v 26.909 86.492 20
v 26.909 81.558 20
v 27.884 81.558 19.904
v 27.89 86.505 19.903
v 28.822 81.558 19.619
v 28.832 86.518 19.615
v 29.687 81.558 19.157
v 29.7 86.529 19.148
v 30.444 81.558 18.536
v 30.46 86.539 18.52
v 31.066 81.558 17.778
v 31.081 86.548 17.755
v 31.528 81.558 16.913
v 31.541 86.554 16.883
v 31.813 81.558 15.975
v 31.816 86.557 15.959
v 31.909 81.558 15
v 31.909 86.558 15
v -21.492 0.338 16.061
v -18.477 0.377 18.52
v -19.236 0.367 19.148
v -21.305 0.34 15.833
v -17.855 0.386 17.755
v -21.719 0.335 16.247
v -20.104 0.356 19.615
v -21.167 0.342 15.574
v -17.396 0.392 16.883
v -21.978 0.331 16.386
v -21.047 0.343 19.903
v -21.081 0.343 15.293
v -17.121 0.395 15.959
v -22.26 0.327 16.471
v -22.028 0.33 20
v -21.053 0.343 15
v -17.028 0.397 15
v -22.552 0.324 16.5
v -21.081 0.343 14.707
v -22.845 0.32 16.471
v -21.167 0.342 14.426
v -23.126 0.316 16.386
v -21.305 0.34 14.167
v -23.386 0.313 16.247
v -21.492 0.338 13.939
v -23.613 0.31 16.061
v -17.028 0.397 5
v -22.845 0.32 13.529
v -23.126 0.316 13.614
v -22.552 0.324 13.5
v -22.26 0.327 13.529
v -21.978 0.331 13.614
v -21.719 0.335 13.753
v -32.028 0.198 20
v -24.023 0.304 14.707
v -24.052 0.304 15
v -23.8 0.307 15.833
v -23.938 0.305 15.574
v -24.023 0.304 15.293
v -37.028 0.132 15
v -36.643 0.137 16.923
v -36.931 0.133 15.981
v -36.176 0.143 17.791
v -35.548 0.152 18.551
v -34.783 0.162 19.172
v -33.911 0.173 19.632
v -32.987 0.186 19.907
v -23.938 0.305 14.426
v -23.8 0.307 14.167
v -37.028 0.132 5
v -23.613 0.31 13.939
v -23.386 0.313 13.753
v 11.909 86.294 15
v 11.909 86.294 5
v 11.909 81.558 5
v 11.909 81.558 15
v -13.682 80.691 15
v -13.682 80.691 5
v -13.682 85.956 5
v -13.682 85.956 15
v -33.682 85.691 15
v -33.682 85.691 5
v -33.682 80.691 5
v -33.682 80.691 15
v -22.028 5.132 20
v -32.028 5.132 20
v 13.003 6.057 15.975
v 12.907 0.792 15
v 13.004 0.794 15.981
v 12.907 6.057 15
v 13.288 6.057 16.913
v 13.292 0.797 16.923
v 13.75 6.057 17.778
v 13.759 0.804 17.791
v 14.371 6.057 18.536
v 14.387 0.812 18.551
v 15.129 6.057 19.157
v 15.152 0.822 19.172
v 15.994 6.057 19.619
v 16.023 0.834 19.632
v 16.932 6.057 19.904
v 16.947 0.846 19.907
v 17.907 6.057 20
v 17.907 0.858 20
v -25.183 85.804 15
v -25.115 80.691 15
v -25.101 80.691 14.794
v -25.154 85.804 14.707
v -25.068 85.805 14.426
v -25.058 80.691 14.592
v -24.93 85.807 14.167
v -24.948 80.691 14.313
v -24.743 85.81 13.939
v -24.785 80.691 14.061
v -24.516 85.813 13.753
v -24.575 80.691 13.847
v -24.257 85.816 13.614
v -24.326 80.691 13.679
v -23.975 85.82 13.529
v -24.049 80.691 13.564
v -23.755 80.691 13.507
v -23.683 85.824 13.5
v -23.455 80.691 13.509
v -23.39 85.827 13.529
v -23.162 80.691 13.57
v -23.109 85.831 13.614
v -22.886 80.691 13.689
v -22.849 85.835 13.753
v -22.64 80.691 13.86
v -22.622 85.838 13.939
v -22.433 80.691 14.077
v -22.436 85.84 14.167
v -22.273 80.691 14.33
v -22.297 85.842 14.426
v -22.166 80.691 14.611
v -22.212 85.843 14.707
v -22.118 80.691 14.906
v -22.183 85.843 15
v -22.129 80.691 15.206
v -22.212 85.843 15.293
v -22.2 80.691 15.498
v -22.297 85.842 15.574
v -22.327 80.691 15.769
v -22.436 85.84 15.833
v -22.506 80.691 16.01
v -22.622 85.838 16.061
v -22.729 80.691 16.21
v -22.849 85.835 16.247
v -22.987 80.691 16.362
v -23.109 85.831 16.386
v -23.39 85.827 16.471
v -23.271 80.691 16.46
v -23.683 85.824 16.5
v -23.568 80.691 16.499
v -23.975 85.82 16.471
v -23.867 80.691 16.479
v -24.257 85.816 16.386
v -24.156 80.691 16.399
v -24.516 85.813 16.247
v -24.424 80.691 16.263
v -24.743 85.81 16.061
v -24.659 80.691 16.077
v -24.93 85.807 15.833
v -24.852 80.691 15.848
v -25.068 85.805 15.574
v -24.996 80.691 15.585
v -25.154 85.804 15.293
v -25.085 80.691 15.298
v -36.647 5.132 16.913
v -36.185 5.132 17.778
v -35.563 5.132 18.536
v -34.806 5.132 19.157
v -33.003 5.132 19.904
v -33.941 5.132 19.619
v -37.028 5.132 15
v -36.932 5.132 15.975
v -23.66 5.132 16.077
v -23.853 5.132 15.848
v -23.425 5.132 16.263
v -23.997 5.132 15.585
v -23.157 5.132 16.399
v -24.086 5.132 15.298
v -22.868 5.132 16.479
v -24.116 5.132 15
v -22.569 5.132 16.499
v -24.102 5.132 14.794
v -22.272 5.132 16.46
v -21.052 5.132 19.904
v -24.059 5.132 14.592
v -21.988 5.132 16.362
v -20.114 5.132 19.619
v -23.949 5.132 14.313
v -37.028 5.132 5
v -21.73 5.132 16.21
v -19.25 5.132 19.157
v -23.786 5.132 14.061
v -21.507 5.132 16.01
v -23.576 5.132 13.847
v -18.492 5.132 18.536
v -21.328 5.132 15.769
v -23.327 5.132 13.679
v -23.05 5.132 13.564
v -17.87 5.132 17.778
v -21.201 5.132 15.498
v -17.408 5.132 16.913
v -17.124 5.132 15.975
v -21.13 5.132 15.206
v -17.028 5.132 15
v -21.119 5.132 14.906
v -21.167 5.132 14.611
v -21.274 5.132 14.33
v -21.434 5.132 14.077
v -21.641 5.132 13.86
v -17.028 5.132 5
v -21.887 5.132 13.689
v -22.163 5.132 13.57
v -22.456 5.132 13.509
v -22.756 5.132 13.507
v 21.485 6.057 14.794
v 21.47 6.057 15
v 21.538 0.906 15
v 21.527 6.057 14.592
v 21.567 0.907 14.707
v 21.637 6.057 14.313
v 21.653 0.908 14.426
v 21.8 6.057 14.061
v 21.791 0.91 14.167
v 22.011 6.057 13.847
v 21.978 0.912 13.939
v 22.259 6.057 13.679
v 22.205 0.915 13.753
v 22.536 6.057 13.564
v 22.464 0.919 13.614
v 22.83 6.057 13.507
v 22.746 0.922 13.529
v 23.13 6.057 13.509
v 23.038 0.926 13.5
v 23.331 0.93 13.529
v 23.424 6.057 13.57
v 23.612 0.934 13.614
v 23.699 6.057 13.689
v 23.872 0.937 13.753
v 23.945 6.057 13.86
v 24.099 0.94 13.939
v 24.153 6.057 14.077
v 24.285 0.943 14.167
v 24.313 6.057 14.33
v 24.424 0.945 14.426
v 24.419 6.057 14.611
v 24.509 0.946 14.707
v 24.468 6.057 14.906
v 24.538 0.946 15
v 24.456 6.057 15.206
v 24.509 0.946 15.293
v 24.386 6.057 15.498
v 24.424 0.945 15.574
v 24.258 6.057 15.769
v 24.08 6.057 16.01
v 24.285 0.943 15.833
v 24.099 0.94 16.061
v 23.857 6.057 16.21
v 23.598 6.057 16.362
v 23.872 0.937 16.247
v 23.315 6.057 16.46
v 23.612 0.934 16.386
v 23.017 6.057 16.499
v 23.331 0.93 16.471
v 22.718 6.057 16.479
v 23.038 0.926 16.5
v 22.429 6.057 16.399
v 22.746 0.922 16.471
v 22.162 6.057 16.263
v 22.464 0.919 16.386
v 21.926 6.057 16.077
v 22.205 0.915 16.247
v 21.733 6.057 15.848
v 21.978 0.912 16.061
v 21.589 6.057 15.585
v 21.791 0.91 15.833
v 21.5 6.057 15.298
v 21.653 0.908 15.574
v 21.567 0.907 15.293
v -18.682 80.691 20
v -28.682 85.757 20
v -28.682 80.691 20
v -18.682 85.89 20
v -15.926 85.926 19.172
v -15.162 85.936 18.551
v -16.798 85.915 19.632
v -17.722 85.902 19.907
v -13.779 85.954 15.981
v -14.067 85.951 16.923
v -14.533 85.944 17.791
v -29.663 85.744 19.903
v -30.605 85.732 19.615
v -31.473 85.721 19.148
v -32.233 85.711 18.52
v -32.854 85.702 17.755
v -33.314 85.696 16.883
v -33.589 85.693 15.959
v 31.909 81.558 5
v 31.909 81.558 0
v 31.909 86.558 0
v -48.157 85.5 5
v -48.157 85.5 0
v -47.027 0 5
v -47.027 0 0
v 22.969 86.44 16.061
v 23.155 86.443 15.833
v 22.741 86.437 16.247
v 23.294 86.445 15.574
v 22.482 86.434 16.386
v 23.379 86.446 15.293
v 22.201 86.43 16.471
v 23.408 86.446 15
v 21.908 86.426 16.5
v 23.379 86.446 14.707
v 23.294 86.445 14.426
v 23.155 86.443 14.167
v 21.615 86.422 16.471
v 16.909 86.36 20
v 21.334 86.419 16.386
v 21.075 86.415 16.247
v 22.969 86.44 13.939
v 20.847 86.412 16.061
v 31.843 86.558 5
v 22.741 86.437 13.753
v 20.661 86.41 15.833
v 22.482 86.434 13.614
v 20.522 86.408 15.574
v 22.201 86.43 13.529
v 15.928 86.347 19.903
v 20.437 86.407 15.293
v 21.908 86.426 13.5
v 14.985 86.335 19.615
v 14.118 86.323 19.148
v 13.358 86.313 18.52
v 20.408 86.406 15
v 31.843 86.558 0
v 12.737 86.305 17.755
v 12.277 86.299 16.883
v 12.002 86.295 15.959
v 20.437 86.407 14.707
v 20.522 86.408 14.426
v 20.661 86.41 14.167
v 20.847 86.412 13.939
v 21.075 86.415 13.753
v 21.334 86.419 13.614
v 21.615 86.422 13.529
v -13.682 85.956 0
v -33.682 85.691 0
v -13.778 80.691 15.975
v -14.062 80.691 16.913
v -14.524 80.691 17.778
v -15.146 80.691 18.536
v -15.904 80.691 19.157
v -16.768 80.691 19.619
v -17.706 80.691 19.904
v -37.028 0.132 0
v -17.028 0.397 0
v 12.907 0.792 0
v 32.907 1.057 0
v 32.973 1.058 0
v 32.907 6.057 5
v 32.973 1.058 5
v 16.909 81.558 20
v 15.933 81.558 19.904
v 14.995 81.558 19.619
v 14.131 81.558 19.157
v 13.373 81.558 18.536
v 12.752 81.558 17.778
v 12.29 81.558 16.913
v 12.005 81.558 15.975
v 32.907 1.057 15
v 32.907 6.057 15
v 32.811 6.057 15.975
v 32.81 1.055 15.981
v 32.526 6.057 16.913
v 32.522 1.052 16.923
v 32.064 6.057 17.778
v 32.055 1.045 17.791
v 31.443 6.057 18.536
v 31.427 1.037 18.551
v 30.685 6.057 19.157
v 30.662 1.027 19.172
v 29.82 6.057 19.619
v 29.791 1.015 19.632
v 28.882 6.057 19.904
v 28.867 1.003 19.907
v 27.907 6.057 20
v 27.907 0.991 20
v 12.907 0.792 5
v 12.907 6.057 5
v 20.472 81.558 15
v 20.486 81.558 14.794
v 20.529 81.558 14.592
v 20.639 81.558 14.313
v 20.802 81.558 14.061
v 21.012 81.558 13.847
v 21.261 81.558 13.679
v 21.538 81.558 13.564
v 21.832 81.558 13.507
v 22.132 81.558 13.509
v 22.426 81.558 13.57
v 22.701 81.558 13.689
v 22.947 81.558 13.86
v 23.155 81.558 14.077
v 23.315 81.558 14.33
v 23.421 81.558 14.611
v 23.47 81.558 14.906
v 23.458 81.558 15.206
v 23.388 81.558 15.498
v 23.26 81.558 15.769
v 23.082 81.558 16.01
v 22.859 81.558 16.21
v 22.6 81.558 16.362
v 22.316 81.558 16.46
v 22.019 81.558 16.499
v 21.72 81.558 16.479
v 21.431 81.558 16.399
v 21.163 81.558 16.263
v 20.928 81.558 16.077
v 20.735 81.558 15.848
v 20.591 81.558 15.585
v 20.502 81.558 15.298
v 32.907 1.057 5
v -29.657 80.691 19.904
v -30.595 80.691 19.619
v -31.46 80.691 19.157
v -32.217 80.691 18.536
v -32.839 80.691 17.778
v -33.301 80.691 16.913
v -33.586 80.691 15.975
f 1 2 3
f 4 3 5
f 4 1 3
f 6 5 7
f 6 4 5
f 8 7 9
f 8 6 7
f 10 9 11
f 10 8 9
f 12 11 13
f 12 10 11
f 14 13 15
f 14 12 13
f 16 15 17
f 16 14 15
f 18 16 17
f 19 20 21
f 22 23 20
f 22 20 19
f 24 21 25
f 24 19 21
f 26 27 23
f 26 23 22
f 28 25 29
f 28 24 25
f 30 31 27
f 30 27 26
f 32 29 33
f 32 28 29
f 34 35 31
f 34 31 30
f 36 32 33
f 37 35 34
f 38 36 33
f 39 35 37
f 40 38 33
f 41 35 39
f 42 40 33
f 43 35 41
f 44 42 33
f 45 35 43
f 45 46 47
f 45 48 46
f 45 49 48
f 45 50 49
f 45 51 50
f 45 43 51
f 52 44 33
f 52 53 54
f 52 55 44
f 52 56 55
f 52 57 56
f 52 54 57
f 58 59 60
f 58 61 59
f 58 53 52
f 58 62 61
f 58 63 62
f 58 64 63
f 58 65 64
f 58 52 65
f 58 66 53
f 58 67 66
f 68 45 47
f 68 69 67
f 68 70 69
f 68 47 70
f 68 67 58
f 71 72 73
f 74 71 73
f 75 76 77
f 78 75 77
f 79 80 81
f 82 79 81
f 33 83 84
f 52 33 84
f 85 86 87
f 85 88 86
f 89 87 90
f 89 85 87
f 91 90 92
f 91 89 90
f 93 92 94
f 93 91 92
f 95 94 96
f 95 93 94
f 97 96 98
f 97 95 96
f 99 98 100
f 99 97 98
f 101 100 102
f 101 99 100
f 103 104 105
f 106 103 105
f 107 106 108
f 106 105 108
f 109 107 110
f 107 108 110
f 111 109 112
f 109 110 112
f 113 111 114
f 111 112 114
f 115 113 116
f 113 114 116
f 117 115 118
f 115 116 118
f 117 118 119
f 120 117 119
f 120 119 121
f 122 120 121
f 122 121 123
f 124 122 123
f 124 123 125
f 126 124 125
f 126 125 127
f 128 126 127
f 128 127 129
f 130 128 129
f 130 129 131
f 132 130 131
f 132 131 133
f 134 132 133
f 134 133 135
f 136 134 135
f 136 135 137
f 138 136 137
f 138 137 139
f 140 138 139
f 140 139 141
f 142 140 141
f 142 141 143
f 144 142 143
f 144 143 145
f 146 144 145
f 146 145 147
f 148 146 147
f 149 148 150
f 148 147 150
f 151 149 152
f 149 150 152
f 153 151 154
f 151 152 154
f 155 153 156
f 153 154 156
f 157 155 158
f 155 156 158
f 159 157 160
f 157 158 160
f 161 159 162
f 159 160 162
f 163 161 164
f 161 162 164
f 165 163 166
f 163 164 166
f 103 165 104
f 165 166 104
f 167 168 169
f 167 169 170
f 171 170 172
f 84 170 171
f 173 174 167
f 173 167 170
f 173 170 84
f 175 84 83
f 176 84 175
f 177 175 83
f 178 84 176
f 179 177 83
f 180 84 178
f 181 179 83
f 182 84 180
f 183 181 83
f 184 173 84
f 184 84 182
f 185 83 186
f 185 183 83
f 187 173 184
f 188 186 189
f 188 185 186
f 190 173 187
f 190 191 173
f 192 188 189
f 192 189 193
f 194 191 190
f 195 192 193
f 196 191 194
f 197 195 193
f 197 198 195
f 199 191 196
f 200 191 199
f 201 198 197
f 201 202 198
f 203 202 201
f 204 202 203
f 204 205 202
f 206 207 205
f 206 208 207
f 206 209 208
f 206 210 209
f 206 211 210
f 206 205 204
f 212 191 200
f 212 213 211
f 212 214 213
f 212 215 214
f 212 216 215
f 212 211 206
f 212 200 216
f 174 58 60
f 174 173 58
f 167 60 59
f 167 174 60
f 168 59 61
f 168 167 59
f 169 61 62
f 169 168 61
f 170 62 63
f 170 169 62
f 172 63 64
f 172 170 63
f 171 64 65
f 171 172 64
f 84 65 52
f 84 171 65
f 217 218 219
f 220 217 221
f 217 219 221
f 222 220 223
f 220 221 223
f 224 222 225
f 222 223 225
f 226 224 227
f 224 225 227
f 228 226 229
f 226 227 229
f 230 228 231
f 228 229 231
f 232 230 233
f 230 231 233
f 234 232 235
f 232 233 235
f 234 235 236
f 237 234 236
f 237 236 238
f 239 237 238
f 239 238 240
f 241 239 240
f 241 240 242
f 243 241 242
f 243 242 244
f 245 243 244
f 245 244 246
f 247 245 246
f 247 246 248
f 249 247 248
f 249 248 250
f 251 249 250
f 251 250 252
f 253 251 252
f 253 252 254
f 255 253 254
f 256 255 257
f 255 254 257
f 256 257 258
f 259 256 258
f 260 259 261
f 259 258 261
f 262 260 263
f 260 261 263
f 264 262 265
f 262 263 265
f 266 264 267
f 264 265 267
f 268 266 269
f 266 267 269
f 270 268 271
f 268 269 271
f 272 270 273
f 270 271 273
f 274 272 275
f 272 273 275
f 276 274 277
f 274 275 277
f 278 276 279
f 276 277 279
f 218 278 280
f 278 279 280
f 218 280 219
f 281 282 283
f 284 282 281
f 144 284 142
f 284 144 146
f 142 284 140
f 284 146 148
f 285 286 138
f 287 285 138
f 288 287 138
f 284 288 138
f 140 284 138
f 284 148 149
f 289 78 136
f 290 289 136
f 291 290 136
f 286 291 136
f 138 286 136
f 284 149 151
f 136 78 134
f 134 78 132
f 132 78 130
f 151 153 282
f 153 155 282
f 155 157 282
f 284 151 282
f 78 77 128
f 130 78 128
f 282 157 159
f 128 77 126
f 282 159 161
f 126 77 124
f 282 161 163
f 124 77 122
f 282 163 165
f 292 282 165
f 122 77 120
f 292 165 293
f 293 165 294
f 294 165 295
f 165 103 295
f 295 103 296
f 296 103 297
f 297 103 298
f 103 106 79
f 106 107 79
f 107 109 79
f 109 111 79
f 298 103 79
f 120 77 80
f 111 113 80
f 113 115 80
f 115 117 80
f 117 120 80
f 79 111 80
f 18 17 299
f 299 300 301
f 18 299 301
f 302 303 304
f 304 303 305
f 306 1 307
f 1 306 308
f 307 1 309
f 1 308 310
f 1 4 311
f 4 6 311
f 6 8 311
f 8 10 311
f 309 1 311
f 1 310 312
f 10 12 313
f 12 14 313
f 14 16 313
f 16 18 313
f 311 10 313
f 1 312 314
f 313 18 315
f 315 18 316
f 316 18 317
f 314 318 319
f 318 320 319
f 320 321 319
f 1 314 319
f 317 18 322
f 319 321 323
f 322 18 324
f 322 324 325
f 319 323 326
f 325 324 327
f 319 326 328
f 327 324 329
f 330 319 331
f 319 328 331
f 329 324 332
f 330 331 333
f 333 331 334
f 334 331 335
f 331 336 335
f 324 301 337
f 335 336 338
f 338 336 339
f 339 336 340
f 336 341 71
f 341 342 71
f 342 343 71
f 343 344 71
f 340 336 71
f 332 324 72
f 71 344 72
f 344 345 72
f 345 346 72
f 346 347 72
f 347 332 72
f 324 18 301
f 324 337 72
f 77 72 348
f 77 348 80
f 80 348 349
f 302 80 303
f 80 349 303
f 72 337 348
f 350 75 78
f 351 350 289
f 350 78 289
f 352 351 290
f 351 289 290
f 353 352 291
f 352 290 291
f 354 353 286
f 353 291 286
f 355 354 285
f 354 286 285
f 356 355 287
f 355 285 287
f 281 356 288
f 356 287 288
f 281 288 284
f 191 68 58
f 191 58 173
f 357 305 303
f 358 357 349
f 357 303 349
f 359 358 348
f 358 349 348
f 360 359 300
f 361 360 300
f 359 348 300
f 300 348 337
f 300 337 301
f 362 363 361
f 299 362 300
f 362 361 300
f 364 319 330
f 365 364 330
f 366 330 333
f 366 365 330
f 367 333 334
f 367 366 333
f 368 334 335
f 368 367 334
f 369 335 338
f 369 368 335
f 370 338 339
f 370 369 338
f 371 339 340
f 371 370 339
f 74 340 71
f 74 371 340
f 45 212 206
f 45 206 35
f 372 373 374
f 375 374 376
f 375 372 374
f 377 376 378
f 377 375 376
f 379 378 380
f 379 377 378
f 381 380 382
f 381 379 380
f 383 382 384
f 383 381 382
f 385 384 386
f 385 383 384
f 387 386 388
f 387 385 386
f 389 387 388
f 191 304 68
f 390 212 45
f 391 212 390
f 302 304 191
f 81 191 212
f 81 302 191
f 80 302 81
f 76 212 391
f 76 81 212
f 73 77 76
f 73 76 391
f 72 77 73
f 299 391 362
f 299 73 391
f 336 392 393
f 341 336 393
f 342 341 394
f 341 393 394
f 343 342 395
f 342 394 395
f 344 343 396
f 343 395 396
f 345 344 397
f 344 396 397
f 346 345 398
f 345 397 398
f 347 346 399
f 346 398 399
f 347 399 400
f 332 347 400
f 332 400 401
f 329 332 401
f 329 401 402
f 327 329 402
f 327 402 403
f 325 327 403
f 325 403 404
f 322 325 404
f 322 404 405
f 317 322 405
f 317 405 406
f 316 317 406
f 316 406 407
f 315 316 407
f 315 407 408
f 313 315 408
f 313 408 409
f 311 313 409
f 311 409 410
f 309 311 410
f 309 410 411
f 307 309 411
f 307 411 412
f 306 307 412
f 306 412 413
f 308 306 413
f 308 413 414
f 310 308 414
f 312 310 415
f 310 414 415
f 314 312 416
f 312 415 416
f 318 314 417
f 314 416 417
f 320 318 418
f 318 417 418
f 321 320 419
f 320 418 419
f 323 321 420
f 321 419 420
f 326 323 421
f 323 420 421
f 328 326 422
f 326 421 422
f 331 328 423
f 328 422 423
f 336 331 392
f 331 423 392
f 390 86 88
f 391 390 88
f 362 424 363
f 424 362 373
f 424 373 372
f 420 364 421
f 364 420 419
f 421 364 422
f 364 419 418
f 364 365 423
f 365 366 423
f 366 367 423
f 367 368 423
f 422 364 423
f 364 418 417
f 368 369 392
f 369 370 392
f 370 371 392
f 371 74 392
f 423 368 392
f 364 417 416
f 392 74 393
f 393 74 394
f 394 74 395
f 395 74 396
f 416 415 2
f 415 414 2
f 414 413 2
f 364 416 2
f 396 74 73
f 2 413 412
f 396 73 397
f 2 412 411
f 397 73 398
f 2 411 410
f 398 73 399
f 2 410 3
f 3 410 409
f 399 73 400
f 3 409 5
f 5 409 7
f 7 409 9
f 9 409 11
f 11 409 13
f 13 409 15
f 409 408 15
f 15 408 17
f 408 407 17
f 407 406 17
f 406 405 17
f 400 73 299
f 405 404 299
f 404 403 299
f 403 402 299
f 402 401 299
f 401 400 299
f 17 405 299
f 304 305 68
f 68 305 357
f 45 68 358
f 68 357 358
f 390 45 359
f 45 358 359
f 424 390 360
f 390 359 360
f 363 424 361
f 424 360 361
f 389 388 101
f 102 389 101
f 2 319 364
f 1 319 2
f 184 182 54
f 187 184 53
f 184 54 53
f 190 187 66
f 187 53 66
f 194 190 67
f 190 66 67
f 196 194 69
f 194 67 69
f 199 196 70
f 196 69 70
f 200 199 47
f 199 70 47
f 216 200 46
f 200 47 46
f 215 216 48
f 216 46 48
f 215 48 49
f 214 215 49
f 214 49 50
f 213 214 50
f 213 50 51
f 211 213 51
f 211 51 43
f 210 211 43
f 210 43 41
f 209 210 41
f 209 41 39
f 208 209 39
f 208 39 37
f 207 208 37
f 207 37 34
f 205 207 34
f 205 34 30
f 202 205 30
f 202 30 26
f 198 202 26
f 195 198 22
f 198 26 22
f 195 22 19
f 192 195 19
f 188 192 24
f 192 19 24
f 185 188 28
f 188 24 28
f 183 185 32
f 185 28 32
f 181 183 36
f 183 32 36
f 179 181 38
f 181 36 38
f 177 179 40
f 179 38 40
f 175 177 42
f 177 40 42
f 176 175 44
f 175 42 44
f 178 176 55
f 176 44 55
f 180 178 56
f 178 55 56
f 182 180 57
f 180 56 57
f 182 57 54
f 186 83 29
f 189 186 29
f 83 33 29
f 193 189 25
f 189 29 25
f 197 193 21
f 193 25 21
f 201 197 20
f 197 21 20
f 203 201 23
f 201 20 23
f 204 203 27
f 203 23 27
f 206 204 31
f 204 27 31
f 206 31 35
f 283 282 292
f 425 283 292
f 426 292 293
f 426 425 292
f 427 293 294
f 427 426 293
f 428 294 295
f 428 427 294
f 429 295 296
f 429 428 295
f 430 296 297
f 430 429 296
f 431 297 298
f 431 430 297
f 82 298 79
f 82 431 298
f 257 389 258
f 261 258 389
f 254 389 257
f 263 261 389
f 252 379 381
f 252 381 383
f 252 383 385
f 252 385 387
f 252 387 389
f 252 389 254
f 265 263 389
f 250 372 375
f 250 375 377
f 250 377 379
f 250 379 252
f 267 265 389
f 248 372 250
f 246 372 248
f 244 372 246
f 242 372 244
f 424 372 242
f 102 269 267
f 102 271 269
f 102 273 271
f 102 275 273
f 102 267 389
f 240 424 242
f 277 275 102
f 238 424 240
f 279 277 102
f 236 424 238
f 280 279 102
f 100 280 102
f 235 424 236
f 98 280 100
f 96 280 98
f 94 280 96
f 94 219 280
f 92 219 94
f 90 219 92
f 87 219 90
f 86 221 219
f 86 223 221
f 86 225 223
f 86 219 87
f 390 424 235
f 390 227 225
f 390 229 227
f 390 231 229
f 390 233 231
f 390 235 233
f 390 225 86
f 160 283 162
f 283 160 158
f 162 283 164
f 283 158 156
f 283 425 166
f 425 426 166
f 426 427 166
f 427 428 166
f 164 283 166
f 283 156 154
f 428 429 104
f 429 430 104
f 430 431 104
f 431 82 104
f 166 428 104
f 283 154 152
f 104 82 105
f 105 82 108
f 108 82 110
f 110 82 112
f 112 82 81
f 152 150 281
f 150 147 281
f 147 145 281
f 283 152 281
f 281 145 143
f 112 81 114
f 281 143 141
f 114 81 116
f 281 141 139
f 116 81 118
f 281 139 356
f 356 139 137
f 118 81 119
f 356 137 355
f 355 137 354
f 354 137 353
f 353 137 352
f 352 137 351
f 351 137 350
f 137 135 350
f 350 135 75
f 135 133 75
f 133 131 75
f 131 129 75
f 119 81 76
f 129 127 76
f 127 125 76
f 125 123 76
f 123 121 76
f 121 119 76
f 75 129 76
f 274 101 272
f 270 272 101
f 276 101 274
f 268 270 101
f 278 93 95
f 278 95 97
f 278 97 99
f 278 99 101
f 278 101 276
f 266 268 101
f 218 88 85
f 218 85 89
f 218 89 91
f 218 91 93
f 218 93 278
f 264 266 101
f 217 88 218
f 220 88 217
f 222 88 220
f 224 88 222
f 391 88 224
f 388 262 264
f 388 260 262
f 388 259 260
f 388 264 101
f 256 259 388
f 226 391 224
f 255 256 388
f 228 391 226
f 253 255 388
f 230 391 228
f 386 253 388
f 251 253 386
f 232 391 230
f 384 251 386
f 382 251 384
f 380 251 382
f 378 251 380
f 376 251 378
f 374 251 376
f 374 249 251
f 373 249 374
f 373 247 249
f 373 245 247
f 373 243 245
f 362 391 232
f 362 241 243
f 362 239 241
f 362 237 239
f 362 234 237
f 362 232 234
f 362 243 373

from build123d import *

# Parameters (mm, degrees)
BOSS_EXTRUDE1_DEPTH   = 5
BOSS_EXTRUDE2_DEPTH   = 20
FILLET1_R             = 5
F_3_0MM_DOWEL_HOLE1_D = 3


with BuildPart() as part:
    # Sketch1 → Boss-Extrude1 (new body)
    with BuildSketch(Plane.XY):
        Polygon((-47.026906911, 0), (32.973093089, 1.057571587), (31.842813456, 86.557571587), (-48.157186544, 85.5), align=None)
    extrude(amount=BOSS_EXTRUDE1_DEPTH)

    # Sketch2 → Boss-Extrude2 (add)
    with BuildSketch(Plane.XY):
        Polygon((-33.681834279, 85.691359016), (-33.681834279, 80.691359016), (-13.681834279, 80.691359016), (-13.681834279, 85.955751912), align=None)
        Polygon((11.908900131, 86.294052332), (11.908900131, 81.558445229), (31.908900131, 81.558445229), (31.908900131, 86.558445229), align=None)
        Polygon((-37.027780592, 0.132184899), (-37.027780592, 5.132184899), (-17.027780592, 5.132184899), (-17.027780592, 0.396577795), align=None)
        Polygon((12.907006414, 0.792305048), (12.907006414, 6.056697944), (32.907006414, 6.056697944), (32.907006414, 1.056697944), align=None)
    extrude(amount=BOSS_EXTRUDE2_DEPTH)

    # Fillet1
    fillet1_edges = [part.edges().sort_by_distance(p)[0] for p in [
        (-33.681834279, 83.191359016, 20),
        (-13.681834279, 83.323555464, 20),
        (31.908900131, 84.058445229, 20),
        (11.908900131, 83.926248781, 20),
        (-17.027780592, 2.764381347, 20),
        (-37.027780592, 2.632184899, 20),
        (32.907006414, 3.556697944, 20),
        (12.907006414, 3.424501496, 20),
    ]]
    fillet(fillet1_edges, radius=FILLET1_R)

    # Ø3.0mm Dowel Hole1 (through all)
    with Locations(Plane(origin=(-1.138496573, 86.121570382, 0), x_dir=(0.9999126319463549, 0.013218489857520067, 0), z_dir=(-0.013218489857520067, 0.9999126319463549, 0))):
        with Locations((-22.546181203, -15), (23.048536729, -15)):
            Hole(F_3_0MM_DOWEL_HOLE1_D / 2)


solid = part.part
